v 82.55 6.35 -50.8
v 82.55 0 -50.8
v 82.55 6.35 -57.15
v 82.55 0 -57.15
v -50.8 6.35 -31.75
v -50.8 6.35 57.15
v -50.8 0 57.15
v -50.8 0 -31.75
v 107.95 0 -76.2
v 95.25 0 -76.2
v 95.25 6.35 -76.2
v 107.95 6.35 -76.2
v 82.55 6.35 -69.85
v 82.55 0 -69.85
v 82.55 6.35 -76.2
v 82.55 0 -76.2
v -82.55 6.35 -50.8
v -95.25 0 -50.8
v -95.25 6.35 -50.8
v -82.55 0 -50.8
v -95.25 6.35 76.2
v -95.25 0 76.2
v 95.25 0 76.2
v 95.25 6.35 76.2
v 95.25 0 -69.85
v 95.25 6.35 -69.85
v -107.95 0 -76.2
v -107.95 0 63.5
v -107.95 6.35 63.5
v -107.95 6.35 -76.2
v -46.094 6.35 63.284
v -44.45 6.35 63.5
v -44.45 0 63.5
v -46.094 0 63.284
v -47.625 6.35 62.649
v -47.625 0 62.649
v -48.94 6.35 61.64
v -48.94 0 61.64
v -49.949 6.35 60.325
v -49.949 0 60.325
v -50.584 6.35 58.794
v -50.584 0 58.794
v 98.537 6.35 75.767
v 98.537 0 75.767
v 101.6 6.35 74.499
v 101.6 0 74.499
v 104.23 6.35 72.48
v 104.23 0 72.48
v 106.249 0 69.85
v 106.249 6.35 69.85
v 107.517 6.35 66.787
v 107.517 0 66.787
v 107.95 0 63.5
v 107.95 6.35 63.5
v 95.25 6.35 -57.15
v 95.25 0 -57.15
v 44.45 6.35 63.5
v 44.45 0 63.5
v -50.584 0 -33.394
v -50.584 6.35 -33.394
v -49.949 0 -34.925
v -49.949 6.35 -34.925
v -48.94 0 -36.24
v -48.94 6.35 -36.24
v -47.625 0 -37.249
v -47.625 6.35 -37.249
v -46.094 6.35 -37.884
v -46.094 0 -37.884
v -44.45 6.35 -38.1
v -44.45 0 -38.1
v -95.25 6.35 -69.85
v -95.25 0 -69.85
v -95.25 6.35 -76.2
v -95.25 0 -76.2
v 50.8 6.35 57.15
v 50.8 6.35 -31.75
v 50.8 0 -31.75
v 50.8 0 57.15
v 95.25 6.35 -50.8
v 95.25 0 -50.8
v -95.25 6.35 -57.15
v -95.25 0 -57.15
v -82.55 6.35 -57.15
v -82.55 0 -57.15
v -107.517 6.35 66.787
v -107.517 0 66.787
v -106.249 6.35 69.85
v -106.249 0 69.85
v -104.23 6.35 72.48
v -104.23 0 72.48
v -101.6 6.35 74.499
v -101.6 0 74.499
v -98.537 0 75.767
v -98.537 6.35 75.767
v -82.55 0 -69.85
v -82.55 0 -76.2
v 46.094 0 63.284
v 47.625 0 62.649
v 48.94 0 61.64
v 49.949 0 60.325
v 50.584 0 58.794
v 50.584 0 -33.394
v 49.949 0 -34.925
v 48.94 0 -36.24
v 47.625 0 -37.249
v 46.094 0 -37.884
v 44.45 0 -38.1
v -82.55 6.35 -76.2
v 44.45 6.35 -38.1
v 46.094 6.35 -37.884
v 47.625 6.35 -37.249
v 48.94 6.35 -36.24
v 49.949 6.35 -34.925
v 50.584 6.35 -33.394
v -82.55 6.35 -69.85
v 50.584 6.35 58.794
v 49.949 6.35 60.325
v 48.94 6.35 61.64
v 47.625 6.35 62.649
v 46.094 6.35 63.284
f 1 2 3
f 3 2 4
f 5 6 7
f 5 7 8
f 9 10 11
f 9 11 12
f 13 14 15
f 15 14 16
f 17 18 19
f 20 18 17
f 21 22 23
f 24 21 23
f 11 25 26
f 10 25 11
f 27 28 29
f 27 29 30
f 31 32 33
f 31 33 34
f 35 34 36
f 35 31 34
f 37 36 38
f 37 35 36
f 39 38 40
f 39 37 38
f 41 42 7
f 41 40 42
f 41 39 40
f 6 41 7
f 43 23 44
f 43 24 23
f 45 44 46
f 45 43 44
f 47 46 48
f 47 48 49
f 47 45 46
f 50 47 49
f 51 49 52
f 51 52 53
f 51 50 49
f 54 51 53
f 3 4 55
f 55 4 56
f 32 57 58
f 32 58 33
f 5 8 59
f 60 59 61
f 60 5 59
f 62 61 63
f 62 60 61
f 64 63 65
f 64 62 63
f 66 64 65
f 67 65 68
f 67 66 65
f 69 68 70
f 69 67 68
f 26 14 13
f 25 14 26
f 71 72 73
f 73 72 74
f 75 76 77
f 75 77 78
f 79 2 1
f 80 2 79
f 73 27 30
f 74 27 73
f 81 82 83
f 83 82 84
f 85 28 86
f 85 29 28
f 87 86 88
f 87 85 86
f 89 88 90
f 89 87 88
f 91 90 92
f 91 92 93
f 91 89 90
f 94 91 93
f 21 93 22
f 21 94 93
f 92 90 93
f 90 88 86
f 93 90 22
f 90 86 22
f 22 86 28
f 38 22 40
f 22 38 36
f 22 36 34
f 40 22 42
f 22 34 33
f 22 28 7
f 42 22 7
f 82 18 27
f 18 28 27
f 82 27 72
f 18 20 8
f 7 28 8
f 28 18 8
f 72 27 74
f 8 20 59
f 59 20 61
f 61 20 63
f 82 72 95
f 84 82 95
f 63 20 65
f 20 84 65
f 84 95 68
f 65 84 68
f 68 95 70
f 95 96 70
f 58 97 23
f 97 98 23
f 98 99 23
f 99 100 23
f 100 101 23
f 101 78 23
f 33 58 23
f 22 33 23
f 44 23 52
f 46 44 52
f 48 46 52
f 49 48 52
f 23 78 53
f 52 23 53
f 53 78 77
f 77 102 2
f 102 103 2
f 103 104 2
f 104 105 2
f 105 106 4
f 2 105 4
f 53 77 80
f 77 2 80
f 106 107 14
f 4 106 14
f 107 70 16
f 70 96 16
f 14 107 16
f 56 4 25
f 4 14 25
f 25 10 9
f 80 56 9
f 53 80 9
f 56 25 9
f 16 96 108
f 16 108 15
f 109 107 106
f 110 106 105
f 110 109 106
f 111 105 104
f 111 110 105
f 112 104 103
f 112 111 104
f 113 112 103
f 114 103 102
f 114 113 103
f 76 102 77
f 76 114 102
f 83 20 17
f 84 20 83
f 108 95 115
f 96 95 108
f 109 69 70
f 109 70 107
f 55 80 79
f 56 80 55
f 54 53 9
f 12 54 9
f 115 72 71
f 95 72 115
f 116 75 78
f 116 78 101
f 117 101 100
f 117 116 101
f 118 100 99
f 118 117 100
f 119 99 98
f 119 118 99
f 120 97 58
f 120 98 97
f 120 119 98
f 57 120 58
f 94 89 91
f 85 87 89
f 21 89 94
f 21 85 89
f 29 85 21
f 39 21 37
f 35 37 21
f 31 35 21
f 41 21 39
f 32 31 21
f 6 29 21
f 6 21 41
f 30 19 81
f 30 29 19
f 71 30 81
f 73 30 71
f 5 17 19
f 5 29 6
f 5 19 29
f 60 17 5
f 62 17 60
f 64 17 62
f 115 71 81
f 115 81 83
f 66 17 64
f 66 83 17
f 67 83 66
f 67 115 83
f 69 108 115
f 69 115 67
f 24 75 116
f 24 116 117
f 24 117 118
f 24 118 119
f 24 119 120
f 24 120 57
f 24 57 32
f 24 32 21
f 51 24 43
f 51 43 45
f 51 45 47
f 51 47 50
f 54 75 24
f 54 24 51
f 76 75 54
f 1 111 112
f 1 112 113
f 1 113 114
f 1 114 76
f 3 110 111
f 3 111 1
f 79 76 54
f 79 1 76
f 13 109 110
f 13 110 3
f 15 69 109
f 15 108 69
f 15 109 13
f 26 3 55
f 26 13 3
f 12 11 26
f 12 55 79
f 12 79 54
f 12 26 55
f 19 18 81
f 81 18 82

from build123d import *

# Parameters (mm, degrees)
ESQUISSE2_W                  = 215.9
ESQUISSE2_H                  = 152.4
BOSS_EXTRU_1_DEPTH           = 6.35
ENL_V_MAT_EXTRU_1_DEPTH      = 133.287433266
ENL_V_MAT_EXTRU_1_DEPTH_BACK = 133.287433266
ESQUISSE3_W                  = 12.7
ESQUISSE3_H                  = 6.35
CONG_1_R                     = 12.7
ENL_V_MAT_EXTRU_2_DEPTH      = 133.287433266


with BuildPart() as part:
    # Esquisse2 → Boss.-Extru.1 (new body)
    with BuildSketch(Plane(origin=(0, 0, 0), x_dir=(1, 0, 0), z_dir=(0, 1, 0))):
        Rectangle(ESQUISSE2_W, ESQUISSE2_H)
    extrude(amount=BOSS_EXTRU_1_DEPTH)

    # Esquisse3 → Enlèv. mat.-Extru.1 (cut, two sides: drawn at the far end of the back side and taken through both)
    with BuildSketch(Plane(origin=(0, 6.35, 0), x_dir=(1, 0, 0), z_dir=(0, 1, 0)).offset(-ENL_V_MAT_EXTRU_1_DEPTH_BACK)):
        with Locations((-88.9, 73.025)):
            Rectangle(ESQUISSE3_W, ESQUISSE3_H)
        with Locations((-88.9, 53.975)):
            Rectangle(ESQUISSE3_W, ESQUISSE3_H)
        with Locations((88.9, 53.975)):
            Rectangle(ESQUISSE3_W, ESQUISSE3_H)
        with Locations((88.9, 73.025)):
            Rectangle(ESQUISSE3_W, ESQUISSE3_H)
    extrude(amount=ENL_V_MAT_EXTRU_1_DEPTH + ENL_V_MAT_EXTRU_1_DEPTH_BACK, mode=Mode.SUBTRACT)

    # Congé1
    cong_1_edges = [part.edges().sort_by_distance(p)[0] for p in [
        (107.95, 3.175, 76.2),
        (-107.95, 3.175, 76.2),
    ]]
    fillet(cong_1_edges, radius=CONG_1_R)

    # Esquisse4 → Enlèv. mat.-Extru.2 (cut, through all)
    with BuildSketch(Plane(origin=(0, 6.35, 0), x_dir=(1, 0, 0), z_dir=(0, 1, 0))):
        with BuildLine():
            Line((-44.45, 38.1), (44.45, 38.1))
            ThreePointArc((44.45, 38.1), (48.940128061, 36.240128061), (50.8, 31.75))
            Line((50.8, 31.75), (50.8, -57.15))
            ThreePointArc((50.8, -57.15), (48.940128061, -61.640128061), (44.45, -63.5))
            Line((44.45, -63.5), (-44.45, -63.5))
            ThreePointArc((-44.45, -63.5), (-48.940128061, -61.640128061), (-50.8, -57.15))
            Line((-50.8, -57.15), (-50.8, 31.75))
            ThreePointArc((-50.8, 31.75), (-48.940128061, 36.240128061), (-44.45, 38.1))
        make_face()
    extrude(amount=-ENL_V_MAT_EXTRU_2_DEPTH, mode=Mode.SUBTRACT)


solid = part.part
